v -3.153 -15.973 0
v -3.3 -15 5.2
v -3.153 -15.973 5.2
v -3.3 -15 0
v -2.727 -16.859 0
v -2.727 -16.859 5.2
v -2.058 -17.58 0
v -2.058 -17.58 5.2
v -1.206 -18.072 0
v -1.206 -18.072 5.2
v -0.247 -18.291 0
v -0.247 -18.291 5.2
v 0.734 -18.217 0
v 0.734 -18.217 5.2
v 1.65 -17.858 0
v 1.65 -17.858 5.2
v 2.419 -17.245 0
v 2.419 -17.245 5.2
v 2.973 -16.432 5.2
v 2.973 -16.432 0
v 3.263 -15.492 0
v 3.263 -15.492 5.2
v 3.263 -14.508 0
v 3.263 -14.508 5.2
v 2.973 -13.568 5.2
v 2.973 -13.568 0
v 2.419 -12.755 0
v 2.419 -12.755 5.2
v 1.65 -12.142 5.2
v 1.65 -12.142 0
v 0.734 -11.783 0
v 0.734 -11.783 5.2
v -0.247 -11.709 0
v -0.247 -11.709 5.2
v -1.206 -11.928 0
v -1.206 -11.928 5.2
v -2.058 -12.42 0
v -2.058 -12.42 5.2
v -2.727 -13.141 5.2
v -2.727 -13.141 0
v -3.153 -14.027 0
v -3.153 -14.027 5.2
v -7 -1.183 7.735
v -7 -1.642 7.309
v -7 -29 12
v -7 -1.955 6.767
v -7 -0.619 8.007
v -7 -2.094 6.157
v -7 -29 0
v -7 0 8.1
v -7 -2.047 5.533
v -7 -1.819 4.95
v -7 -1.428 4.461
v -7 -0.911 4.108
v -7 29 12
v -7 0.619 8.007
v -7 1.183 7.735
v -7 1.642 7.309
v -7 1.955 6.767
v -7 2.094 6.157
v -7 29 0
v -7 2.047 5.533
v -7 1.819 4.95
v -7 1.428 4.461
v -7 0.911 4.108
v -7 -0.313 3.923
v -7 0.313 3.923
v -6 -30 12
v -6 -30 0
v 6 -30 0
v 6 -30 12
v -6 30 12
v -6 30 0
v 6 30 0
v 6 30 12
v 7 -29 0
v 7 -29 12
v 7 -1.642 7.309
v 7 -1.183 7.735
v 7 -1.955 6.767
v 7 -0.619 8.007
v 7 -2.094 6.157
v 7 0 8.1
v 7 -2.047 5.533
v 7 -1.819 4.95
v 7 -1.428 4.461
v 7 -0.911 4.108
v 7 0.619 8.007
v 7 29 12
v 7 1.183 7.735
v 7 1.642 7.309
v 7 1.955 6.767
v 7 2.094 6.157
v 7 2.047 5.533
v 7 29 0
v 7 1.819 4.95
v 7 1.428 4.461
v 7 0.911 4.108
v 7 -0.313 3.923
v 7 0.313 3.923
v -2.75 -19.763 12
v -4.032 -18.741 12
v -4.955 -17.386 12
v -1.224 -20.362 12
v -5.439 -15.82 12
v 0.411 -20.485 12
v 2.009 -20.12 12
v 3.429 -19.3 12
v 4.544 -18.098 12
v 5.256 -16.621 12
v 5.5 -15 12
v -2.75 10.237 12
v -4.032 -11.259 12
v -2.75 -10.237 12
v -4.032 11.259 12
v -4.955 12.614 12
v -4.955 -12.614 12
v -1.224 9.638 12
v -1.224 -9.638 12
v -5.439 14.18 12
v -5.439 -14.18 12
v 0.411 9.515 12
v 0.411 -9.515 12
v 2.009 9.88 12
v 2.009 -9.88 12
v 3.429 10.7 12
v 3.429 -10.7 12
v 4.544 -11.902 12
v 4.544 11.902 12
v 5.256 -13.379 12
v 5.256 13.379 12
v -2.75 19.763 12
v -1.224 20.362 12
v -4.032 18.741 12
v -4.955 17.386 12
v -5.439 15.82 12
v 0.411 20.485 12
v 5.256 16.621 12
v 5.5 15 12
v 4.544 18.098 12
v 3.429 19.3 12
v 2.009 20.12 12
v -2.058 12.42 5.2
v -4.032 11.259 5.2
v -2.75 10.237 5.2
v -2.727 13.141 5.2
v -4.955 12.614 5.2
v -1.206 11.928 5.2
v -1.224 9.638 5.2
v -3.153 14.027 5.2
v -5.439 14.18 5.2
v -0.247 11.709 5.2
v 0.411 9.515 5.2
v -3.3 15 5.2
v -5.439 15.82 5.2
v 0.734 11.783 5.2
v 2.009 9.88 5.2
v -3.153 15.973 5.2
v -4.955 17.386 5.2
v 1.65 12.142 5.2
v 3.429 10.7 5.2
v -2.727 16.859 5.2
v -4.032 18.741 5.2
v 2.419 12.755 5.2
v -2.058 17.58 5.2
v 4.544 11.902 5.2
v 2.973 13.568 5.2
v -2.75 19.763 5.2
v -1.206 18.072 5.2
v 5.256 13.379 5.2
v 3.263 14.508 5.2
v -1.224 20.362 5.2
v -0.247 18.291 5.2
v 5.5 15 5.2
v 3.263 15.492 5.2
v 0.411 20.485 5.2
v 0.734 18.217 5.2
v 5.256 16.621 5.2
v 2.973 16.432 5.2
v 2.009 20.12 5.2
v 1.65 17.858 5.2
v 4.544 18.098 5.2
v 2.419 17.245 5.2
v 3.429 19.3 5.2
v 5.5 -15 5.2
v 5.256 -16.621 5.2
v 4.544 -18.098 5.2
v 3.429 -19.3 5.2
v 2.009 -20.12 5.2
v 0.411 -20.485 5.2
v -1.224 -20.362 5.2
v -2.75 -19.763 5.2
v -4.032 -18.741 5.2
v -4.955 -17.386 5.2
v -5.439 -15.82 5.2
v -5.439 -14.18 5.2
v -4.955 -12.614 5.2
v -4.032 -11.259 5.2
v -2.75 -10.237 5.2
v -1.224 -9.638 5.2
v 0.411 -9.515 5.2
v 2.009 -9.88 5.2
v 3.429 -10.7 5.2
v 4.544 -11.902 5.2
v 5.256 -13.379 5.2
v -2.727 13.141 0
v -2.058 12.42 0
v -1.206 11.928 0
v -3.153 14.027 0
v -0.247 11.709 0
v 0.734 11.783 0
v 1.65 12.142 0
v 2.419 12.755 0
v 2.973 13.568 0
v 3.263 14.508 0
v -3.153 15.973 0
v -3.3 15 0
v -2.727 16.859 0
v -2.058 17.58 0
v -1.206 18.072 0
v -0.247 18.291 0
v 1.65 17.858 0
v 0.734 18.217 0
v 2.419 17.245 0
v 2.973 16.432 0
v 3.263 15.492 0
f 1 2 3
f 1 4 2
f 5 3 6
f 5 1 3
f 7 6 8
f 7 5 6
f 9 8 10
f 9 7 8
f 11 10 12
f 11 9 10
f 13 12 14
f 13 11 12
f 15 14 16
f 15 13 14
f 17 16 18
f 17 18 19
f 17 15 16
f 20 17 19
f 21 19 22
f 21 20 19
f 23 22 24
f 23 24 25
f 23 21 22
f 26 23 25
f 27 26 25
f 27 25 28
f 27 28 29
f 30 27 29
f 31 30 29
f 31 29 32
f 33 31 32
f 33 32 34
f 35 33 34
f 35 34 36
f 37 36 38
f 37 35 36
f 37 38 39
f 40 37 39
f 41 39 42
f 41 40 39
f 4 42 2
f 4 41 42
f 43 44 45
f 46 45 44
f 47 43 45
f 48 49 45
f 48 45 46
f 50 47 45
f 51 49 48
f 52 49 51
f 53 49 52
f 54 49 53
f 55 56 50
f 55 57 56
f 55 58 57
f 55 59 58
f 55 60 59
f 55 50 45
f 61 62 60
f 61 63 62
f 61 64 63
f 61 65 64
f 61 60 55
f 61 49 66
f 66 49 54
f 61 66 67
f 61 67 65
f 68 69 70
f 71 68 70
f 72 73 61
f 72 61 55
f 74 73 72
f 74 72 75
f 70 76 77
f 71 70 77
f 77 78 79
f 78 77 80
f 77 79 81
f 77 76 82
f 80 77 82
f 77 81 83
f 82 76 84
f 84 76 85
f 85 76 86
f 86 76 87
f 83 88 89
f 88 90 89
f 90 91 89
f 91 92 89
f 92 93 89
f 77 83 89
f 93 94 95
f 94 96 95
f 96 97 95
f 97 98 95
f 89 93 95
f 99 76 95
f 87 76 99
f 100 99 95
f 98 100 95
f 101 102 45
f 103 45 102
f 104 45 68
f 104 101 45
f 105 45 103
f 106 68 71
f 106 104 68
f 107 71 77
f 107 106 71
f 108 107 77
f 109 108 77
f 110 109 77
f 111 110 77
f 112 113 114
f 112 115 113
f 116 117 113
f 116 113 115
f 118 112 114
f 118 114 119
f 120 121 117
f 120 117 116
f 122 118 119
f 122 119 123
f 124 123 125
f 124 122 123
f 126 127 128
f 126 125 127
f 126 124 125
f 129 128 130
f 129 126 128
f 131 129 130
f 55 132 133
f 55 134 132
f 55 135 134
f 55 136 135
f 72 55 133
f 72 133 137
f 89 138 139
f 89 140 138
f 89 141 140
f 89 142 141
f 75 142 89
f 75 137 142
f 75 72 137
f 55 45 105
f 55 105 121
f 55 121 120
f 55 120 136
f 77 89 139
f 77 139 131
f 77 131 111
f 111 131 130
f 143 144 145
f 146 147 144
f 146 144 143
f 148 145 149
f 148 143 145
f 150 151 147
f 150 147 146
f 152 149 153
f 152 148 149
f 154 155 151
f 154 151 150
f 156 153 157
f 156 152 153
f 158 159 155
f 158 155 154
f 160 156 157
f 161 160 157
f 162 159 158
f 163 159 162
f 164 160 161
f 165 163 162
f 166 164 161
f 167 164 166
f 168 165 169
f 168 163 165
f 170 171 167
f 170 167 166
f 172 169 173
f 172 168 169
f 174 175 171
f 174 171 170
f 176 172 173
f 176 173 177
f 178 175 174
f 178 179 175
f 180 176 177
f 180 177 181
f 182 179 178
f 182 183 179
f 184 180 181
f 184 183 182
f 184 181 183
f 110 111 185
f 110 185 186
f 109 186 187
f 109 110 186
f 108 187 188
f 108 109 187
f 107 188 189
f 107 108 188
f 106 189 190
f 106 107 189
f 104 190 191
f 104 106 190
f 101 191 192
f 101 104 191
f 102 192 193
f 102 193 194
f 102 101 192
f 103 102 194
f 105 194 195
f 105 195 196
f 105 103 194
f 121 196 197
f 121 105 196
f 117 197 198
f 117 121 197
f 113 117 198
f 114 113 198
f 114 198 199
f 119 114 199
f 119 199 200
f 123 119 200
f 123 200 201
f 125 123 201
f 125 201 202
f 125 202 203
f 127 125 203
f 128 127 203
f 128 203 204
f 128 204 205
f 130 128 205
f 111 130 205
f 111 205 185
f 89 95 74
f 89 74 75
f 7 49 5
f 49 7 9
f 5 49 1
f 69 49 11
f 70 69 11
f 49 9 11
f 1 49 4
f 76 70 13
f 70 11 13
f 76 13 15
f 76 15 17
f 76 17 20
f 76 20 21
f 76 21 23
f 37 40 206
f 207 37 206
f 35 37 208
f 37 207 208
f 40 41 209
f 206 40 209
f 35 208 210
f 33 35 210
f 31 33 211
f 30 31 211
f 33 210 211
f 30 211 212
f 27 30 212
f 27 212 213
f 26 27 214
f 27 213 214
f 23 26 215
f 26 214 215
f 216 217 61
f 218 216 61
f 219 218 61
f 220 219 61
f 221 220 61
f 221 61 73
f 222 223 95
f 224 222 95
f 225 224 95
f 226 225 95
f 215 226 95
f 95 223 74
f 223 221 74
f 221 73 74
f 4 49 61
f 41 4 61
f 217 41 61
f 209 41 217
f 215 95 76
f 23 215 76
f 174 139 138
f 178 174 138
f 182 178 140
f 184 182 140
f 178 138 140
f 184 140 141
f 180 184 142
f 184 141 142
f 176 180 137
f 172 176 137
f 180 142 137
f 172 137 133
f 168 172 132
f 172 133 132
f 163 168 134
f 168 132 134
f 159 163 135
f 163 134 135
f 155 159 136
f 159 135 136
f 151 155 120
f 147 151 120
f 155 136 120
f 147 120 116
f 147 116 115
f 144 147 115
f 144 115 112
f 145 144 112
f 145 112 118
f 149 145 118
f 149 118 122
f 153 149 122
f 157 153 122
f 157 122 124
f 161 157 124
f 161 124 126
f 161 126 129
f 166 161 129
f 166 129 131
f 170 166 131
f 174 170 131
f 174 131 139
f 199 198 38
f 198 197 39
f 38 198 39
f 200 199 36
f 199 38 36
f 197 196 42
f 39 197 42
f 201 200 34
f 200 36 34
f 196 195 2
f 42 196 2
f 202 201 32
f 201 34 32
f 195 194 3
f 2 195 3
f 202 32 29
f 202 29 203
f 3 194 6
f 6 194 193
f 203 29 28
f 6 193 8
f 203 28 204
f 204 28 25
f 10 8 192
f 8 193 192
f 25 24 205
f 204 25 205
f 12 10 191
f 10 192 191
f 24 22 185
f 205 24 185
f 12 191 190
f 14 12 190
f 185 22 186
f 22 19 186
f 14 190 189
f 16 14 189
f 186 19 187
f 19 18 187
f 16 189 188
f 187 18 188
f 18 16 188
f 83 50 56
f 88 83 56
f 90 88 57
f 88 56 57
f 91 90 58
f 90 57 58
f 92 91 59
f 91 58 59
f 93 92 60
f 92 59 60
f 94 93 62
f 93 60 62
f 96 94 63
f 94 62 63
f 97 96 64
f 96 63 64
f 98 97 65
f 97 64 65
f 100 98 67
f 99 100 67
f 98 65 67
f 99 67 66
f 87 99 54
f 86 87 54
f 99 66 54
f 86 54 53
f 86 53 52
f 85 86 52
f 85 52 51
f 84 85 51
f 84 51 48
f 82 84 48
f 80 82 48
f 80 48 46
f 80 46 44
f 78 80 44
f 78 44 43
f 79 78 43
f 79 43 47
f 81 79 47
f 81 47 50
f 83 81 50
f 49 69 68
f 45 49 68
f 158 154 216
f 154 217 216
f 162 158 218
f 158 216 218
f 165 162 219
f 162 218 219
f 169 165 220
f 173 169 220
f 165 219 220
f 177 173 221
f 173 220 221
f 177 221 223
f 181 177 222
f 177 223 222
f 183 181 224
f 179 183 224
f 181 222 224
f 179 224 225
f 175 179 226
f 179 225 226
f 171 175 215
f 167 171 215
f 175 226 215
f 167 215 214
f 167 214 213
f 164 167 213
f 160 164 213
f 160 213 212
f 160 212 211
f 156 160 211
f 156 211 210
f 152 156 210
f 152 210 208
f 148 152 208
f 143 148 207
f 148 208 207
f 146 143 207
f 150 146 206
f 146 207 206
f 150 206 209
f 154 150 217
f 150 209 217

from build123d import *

# Parameters (mm, degrees)
SKETCH_1_W                   = 14
SKETCH_1_H                   = 60
EXTRUDE_1_DEPTH              = 12
HOLE_WIZARD_M6_1_D           = 6.6
HOLE_WIZARD_M6_1_CBORE_D     = 11
HOLE_WIZARD_M6_1_CBORE_DEPTH = 6.8
CHAMFER_1_SIZE               = 1
HOLE_WIZARD_M5_1_D           = 4.2


with BuildPart() as part:
    # 草图1 → 凸台-拉伸1 (new body)
    with BuildSketch(Plane.XY):
        Rectangle(SKETCH_1_W, SKETCH_1_H)
    extrude(amount=EXTRUDE_1_DEPTH)

    # M6 六角圆柱头螺钉的柱形沉头孔1 (through all)
    with Locations(Plane.XY.offset(12)):
        with Locations((0, 15)):
            hole_wizard_m6_1 = CounterBoreHole(HOLE_WIZARD_M6_1_D / 2, HOLE_WIZARD_M6_1_CBORE_D / 2, HOLE_WIZARD_M6_1_CBORE_DEPTH)

    # 镜向1: M6 六角圆柱头螺钉的柱形沉头孔1 across plane
    add(hole_wizard_m6_1.mirror(Plane.ZX), mode=Mode.SUBTRACT)

    # 倒角1
    chamfer_1_edges = [part.edges().sort_by_distance(p)[0] for p in [
        (7, -30, 6),
        (-7, -30, 6),
        (-7, 30, 6),
        (7, 30, 6),
    ]]
    chamfer(chamfer_1_edges, length=CHAMFER_1_SIZE)

    # M5 螺纹孔1 (through all)
    with Locations(Plane(origin=(7, 0, 0), x_dir=(0, 0, -1), z_dir=(1, 0, 0))):
        with Locations((-6, 0)):
            Hole(HOLE_WIZARD_M5_1_D / 2)


solid = part.part
